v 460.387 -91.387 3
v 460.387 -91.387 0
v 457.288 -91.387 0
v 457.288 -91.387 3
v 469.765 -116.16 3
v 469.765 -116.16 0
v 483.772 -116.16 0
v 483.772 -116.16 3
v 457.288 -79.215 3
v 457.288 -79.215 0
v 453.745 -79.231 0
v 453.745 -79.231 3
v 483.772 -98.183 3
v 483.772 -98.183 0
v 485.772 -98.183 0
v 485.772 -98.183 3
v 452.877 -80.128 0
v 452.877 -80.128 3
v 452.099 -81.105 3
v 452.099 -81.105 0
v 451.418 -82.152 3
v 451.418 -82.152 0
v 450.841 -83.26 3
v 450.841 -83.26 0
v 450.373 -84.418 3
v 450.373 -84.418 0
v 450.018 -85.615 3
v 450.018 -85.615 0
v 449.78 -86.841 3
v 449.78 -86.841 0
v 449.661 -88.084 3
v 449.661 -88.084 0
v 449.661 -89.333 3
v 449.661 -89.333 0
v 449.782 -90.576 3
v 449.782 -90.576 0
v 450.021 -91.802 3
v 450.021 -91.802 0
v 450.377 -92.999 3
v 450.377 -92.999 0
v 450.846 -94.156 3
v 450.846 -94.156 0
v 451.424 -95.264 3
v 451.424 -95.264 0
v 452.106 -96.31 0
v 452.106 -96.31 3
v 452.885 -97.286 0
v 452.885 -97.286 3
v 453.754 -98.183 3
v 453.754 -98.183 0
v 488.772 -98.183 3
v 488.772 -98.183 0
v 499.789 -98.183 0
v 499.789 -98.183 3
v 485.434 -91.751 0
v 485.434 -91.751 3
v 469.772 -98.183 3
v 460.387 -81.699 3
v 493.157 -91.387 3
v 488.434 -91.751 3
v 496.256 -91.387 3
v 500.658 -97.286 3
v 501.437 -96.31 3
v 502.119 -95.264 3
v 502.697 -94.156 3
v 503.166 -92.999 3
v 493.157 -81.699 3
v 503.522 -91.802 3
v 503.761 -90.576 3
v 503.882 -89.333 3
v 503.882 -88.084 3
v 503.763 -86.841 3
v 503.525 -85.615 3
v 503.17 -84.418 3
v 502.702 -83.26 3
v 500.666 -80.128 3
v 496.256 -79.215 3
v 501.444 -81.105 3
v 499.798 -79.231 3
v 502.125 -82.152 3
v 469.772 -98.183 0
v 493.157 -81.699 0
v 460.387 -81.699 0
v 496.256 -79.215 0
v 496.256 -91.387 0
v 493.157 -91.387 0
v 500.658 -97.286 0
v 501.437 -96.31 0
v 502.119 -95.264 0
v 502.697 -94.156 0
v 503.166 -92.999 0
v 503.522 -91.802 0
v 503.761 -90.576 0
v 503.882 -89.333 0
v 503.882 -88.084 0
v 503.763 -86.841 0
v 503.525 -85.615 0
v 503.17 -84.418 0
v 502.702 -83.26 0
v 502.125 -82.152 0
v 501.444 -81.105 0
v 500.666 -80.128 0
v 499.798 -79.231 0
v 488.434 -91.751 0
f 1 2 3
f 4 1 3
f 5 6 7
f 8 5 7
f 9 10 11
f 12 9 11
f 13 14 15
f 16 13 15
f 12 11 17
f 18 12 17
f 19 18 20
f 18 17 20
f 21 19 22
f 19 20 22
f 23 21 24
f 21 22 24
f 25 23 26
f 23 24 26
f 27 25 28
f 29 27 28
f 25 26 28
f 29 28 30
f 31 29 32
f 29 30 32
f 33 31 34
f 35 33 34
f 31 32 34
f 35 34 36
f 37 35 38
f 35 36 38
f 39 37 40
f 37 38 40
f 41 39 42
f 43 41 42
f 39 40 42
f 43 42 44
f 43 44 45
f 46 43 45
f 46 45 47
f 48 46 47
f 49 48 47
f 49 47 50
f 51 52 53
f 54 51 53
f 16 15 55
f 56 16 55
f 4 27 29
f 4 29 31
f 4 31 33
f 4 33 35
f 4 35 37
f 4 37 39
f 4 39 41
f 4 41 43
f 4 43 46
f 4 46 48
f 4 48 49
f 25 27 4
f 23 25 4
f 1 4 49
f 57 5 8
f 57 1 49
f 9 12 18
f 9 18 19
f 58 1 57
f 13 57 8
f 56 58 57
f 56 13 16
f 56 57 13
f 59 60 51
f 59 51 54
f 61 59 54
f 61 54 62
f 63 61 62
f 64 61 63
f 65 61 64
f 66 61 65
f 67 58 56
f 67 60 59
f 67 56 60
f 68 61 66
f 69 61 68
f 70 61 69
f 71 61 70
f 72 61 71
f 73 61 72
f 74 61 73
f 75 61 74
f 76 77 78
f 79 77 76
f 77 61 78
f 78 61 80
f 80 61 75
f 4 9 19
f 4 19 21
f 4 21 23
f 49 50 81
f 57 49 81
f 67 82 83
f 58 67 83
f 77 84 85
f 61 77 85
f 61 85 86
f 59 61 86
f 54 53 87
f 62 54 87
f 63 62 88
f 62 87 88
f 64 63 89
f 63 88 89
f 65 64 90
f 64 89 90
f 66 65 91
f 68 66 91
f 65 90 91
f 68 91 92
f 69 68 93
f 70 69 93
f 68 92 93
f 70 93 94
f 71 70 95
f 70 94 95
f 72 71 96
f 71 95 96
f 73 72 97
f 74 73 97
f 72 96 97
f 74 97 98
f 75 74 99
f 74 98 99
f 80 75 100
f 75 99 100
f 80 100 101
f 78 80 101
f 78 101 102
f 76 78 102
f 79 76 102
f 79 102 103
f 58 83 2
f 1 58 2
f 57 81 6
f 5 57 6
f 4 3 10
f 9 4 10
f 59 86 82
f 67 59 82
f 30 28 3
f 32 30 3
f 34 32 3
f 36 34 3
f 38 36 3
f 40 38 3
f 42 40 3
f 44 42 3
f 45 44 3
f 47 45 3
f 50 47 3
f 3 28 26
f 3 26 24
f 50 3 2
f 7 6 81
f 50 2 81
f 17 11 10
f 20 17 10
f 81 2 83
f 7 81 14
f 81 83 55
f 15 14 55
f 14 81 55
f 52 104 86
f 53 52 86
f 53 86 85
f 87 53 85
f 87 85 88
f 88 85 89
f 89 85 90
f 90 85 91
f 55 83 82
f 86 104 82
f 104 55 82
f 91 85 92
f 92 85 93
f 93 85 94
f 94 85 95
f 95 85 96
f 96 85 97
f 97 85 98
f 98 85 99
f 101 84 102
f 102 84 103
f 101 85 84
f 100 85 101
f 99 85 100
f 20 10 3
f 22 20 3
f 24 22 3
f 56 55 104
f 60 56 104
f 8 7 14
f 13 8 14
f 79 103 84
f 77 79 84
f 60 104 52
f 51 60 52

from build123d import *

# Parameters (mm, degrees)
BASE_EXTRUDE_DEPTH = 3


with BuildPart() as part:
    # Sketch1 → Base-Extrude (new body)
    with BuildSketch(Plane.XY):
        with BuildLine():
            Line((457.287518249, -79.214649933), (453.745445311, -79.230530857))
            ThreePointArc((453.745445311, -79.230530857), (449.646042877, -88.708611573), (453.753998991, -98.182988118))
            Line((453.753998991, -98.182988118), (469.771556658, -98.182988118))
            Line((469.771556658, -98.182988118), (469.765330169, -116.15983969))
            Line((469.765330169, -116.15983969), (483.771556658, -116.15983969))
            Line((483.771556658, -116.15983969), (483.771556658, -98.182988118))
            Line((483.771556658, -98.182988118), (485.771556658, -98.182988118))
            Line((485.771556658, -98.182988118), (485.434474546, -91.751078274))
            Line((485.434474546, -91.751078274), (488.434474546, -91.751078274))
            Line((488.434474546, -91.751078274), (488.771556658, -98.182988118))
            Line((488.771556658, -98.182988118), (499.789114325, -98.182988118))
            ThreePointArc((499.789114325, -98.182988118), (503.897070438, -88.708611573), (499.797668004, -79.230530857))
            Line((499.797668004, -79.230530857), (496.255595066, -79.214649933))
            Line((496.255595066, -79.214649933), (496.255595066, -91.387236838))
            Line((496.255595066, -91.387236838), (493.156556658, -91.387236838))
            Line((493.156556658, -91.387236838), (493.156556658, -81.698972351))
            Line((493.156556658, -81.698972351), (460.386556658, -81.698972351))
            Line((460.386556658, -81.698972351), (460.386556658, -91.387236838))
            Line((460.386556658, -91.387236838), (457.287518249, -91.387236838))
            Line((457.287518249, -91.387236838), (457.287518249, -79.214649933))
        make_face()
    extrude(amount=BASE_EXTRUDE_DEPTH)


solid = part.part
